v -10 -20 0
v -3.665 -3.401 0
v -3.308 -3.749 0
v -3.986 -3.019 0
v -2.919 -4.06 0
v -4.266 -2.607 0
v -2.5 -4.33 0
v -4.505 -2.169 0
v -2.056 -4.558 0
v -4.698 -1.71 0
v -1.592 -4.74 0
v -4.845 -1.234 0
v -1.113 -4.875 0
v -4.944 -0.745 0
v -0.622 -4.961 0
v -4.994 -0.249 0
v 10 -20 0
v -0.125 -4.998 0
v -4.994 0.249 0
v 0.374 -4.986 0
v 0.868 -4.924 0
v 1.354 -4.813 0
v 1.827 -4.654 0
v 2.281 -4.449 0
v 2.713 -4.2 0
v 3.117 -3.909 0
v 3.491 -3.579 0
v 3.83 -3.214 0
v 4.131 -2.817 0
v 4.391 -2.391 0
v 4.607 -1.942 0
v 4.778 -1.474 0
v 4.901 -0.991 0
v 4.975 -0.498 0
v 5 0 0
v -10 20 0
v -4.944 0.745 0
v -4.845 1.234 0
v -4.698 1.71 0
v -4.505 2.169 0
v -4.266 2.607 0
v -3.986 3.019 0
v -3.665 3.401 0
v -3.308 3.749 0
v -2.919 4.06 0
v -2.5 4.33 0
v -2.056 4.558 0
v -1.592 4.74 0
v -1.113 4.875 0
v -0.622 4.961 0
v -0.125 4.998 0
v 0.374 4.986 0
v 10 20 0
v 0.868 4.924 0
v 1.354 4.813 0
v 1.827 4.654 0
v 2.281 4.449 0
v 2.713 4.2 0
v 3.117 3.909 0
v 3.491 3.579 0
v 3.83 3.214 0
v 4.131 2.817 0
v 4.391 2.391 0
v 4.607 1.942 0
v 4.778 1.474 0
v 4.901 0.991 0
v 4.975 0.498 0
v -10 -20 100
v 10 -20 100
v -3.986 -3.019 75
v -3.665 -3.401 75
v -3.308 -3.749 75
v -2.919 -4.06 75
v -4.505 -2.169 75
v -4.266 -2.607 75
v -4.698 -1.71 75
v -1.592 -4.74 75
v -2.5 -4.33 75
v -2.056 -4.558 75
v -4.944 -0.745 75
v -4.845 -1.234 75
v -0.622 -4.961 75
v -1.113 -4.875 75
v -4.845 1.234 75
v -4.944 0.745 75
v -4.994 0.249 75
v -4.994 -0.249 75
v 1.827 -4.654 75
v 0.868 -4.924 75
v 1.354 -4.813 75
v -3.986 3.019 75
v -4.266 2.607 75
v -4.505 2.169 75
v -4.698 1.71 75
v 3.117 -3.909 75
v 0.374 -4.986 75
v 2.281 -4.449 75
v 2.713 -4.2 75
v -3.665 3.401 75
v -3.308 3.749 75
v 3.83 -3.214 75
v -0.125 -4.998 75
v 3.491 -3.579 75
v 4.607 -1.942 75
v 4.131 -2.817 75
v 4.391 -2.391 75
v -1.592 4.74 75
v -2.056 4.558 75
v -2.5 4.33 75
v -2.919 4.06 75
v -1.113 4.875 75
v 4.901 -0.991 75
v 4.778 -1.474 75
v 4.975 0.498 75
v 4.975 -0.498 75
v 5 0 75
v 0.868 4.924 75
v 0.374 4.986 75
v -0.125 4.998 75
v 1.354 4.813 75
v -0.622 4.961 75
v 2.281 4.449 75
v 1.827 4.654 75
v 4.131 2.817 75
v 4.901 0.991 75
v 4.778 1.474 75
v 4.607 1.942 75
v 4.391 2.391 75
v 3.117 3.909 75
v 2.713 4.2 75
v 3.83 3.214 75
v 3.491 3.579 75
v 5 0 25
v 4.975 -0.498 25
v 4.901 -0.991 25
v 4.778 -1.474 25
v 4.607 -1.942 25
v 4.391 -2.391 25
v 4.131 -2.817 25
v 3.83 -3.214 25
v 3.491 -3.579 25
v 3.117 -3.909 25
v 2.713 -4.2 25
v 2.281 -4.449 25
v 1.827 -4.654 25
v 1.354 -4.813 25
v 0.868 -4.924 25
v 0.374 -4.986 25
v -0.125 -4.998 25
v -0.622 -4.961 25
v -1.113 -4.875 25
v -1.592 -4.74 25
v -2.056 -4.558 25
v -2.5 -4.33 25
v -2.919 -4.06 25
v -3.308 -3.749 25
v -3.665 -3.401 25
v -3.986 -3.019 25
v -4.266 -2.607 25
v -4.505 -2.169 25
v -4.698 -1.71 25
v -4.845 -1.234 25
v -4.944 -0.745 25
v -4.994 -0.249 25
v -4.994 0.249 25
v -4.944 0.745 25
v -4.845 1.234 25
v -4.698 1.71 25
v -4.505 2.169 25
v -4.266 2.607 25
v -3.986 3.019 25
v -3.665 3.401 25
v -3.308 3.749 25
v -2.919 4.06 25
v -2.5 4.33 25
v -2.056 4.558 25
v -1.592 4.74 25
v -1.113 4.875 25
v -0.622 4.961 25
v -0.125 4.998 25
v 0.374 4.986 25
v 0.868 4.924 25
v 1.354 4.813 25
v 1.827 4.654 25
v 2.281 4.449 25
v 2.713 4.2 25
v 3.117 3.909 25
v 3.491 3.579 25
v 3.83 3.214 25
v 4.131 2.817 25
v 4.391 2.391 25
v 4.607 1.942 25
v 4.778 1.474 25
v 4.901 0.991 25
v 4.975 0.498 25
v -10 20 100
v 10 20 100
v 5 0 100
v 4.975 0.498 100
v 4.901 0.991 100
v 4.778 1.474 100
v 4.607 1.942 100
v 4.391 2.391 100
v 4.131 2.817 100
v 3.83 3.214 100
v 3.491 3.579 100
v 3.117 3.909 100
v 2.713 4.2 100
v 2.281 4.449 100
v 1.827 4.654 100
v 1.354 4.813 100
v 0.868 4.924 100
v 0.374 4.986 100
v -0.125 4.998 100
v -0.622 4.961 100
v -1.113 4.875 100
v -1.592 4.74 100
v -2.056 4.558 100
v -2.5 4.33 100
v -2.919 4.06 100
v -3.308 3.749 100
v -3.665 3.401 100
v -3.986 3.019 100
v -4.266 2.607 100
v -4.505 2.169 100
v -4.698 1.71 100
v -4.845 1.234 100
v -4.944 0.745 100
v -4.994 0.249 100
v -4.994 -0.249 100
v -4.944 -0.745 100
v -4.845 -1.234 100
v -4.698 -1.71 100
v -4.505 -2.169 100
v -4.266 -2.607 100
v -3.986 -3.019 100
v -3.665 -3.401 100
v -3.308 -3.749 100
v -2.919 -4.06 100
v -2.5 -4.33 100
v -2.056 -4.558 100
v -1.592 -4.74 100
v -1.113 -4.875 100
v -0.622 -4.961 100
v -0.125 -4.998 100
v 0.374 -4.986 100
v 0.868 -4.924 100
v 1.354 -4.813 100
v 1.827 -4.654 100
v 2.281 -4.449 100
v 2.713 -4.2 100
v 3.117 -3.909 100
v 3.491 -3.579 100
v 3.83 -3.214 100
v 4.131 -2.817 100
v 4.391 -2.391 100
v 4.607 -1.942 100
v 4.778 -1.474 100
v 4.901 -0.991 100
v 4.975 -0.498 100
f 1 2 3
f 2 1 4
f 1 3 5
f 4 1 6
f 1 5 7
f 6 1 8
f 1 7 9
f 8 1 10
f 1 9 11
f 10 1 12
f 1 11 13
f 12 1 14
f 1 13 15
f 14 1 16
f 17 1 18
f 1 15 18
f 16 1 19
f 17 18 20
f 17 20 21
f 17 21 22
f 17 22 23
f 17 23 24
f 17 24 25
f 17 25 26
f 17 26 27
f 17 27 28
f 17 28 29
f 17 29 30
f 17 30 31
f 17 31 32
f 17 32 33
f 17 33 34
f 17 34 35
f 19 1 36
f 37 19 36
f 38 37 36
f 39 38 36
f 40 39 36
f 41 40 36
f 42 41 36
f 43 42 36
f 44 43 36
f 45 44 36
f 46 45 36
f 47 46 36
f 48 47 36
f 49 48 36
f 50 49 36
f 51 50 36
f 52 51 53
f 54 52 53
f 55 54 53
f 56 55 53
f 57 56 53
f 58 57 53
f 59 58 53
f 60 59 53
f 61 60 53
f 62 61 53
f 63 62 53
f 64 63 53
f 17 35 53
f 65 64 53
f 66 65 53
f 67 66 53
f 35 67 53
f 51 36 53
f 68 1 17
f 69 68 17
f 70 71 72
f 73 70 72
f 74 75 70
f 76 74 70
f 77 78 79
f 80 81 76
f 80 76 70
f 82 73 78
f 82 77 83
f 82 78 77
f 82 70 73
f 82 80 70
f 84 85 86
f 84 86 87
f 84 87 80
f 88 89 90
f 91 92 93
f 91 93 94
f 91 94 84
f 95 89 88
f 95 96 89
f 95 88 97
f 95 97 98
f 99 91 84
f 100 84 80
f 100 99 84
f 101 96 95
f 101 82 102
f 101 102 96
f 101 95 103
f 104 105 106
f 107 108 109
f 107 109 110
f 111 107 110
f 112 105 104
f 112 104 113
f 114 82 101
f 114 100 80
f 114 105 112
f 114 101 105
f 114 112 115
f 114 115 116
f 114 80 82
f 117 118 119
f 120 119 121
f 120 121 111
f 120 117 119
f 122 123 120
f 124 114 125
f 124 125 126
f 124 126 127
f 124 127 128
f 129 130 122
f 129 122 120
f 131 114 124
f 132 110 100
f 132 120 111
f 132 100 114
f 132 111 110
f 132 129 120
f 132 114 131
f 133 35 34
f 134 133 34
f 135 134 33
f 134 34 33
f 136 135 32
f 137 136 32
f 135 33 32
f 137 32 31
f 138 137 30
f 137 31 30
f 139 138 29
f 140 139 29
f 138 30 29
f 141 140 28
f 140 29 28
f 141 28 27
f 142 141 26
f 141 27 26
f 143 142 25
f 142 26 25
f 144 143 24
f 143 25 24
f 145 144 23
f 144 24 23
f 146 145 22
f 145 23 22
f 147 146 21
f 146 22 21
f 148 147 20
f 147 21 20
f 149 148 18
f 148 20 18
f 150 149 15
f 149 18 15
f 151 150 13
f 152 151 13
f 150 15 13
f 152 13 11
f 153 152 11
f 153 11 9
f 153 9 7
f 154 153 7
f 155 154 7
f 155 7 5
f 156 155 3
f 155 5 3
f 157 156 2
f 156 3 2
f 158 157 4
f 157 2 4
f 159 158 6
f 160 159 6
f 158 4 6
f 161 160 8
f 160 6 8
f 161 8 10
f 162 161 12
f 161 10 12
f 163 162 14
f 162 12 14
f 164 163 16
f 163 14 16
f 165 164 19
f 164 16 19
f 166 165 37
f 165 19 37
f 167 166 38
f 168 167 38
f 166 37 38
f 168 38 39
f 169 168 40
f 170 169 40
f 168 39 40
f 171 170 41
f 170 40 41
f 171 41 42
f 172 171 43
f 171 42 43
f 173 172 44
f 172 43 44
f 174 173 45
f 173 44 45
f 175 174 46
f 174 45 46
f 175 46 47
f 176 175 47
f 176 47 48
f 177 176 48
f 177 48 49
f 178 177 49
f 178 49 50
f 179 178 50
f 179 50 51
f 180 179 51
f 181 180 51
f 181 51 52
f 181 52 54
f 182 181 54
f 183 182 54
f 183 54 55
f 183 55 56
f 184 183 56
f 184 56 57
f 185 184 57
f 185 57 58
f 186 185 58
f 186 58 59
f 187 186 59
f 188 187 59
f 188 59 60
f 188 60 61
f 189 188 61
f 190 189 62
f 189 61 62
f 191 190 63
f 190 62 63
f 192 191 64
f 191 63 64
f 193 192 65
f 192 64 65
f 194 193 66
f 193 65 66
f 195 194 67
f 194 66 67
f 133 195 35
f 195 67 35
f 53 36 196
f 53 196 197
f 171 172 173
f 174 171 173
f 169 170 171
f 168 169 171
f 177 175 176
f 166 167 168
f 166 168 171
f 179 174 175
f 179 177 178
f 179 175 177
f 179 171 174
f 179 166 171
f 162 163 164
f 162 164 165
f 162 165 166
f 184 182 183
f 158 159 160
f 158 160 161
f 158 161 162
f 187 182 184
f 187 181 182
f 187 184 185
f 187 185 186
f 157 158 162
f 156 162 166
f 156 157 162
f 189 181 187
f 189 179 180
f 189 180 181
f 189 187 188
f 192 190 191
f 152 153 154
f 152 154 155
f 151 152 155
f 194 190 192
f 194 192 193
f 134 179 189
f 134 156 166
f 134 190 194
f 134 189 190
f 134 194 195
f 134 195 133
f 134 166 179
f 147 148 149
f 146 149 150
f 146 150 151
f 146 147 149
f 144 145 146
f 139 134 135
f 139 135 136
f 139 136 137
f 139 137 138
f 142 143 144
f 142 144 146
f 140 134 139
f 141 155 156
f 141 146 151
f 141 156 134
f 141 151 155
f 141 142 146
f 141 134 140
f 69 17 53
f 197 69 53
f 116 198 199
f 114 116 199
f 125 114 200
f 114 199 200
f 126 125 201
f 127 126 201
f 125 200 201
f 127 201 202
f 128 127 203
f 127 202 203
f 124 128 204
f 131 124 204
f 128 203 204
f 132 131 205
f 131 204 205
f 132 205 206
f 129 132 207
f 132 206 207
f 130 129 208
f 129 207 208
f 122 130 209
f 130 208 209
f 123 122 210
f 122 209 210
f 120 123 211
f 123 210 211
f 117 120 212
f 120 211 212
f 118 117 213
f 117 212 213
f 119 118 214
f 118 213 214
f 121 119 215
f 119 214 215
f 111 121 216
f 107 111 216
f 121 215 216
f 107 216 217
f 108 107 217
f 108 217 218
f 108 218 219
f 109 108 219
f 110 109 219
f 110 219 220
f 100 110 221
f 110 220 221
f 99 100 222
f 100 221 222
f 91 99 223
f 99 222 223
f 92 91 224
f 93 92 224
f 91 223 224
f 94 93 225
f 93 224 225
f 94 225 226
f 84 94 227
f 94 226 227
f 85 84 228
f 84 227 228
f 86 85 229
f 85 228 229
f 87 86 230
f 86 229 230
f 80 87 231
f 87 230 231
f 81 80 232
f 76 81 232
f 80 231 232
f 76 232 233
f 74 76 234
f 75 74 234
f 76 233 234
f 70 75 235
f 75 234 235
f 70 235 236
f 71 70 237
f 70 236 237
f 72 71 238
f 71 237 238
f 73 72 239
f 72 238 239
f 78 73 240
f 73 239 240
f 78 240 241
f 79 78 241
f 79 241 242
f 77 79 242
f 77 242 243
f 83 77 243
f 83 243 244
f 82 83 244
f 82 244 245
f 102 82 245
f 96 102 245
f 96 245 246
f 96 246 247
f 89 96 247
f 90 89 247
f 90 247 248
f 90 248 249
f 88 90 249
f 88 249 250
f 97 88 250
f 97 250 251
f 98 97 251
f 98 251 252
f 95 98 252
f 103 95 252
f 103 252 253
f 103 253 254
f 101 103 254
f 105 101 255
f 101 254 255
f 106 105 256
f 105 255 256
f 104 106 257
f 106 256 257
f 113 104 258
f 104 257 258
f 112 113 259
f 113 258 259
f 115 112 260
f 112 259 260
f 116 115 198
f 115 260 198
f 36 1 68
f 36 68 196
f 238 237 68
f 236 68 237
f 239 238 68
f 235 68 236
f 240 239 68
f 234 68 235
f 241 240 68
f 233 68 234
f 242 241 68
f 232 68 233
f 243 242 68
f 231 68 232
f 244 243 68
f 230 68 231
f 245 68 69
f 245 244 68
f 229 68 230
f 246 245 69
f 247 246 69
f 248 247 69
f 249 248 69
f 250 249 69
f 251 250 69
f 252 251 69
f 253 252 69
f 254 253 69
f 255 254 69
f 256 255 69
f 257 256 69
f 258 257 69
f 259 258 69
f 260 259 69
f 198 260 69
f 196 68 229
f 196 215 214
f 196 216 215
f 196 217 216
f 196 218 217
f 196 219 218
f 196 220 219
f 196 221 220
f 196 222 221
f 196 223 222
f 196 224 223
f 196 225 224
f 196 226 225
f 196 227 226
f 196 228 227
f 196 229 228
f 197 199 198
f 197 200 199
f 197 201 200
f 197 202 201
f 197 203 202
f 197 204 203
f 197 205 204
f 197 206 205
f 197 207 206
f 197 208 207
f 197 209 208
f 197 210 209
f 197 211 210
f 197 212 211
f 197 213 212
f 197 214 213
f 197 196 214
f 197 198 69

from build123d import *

# Parameters (mm, degrees)
F0_W     = 20
F0_H     = 40
F1_DEPTH = 100
F2_R     = 5
F3_DEPTH = 25
F4_R     = 5
F5_DEPTH = 25


with BuildPart() as f1:
    # F0 (on Top) → F1 (new body)
    with BuildSketch(Plane.XY):
        Rectangle(F0_W, F0_H)
    extrude(amount=F1_DEPTH)

    # F2 (on face) → F3 (cut)
    with BuildSketch(Plane.XY.offset(100)):
        Circle(F2_R)
    extrude(amount=-F3_DEPTH, mode=Mode.SUBTRACT)

    # F4 (on face) → F5 (cut)
    with BuildSketch(Plane(origin=(0, 0, 0), x_dir=(1, 0, 0), z_dir=(0, 0, -1))):
        Circle(F4_R)
    extrude(amount=-F5_DEPTH, mode=Mode.SUBTRACT)


solid = f1.part
